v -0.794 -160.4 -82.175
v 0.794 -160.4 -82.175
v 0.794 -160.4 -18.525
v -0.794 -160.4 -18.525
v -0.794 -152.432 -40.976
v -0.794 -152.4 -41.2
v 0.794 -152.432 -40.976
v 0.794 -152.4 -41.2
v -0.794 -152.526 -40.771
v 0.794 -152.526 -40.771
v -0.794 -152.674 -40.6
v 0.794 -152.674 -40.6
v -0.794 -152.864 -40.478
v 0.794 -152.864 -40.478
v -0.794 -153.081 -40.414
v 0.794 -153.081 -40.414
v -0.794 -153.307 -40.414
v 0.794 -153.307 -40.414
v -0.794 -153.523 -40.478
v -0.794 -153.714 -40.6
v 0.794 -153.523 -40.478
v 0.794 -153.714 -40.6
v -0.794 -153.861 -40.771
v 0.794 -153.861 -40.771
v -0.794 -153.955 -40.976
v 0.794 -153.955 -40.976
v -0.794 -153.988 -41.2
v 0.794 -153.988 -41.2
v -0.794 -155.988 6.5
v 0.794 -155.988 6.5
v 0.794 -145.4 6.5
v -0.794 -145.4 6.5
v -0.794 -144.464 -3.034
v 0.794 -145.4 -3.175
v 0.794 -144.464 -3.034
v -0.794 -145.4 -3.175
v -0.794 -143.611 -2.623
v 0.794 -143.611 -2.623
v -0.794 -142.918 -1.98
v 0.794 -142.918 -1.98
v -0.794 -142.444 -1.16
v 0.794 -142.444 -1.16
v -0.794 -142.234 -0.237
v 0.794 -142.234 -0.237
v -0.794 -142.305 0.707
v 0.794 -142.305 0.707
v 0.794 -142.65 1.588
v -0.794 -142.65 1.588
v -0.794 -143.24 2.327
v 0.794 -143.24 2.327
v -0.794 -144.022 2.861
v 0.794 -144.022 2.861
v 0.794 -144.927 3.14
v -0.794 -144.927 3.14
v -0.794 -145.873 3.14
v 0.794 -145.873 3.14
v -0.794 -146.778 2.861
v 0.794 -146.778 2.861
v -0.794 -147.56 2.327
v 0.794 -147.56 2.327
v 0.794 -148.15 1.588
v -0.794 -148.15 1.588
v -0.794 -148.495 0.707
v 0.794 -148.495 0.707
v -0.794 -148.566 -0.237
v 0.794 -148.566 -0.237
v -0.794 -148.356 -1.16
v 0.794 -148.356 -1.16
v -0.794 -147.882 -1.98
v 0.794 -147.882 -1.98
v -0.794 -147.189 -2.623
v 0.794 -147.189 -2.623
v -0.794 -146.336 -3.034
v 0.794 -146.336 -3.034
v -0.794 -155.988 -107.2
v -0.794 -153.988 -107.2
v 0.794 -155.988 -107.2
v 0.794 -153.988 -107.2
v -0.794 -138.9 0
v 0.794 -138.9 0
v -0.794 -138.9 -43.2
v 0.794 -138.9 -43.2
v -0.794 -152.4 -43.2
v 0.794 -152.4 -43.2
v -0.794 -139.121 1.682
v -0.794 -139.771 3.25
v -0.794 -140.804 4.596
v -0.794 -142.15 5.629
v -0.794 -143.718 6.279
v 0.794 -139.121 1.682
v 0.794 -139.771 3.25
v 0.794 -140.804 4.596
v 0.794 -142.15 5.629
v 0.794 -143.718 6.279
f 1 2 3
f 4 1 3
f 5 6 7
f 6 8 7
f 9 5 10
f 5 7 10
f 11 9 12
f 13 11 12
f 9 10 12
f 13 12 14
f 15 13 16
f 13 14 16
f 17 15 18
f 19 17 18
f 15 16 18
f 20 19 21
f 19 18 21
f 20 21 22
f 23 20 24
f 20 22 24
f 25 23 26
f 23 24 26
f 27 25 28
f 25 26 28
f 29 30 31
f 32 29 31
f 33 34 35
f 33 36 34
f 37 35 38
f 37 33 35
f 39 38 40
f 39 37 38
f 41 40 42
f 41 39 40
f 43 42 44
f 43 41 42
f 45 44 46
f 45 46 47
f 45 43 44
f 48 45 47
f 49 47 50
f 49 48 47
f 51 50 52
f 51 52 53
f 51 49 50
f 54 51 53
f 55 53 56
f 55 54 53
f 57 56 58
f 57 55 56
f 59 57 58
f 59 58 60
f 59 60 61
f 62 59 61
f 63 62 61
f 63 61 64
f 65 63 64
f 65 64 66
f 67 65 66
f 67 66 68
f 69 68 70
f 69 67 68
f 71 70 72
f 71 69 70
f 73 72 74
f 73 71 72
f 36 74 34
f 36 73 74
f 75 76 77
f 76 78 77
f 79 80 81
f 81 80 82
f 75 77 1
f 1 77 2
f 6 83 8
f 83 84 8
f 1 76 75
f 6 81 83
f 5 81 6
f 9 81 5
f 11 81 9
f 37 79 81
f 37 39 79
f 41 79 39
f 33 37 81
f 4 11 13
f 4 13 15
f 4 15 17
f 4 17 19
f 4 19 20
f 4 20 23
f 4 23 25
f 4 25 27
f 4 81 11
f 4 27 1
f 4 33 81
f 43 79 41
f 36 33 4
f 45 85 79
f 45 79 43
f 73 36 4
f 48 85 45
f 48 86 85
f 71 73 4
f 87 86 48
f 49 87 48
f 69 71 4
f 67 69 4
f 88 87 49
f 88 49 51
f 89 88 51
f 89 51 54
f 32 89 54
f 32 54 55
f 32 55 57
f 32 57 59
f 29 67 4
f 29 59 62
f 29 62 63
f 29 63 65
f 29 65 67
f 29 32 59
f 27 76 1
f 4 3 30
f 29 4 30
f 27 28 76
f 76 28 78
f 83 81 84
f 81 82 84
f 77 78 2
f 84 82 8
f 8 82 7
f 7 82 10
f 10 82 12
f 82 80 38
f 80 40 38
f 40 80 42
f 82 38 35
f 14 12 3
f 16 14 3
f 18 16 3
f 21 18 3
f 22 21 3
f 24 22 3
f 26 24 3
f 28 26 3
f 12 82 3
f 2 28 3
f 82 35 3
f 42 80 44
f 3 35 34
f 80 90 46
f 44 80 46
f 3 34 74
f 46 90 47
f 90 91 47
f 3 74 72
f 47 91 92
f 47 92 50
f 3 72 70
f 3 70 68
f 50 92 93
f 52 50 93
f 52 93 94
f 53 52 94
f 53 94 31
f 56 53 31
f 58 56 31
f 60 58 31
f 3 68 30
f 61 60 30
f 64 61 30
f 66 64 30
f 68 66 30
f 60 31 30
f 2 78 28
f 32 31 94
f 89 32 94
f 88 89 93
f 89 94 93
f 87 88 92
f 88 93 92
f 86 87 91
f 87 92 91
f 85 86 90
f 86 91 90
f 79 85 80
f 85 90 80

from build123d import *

# Parameters (mm, degrees)
SKETCH1_R           = 3.175
BOSS_EXTRUDE1_DEPTH = 0.79375


with BuildPart() as part:
    # Sketch1 → Boss-Extrude1 (new, symmetric)
    with BuildSketch(Plane.YZ):
        with BuildLine():
            Line((-138.9, 0), (-138.9, -43.2))
            Line((-138.9, -43.2), (-152.4, -43.2))
            Line((-152.4, -43.2), (-152.4, -41.2))
            ThreePointArc((-152.4, -41.2), (-153.19375, -40.40625), (-153.9875, -41.2))
            Line((-153.9875, -41.2), (-153.9875, -107.2))
            Line((-153.9875, -107.2), (-155.9875, -107.2))
            Line((-155.9875, -107.2), (-160.4, -82.175468971))
            Line((-160.4, -82.175468971), (-160.4, -18.524531029))
            Line((-160.4, -18.524531029), (-155.9875, 6.5))
            Line((-155.9875, 6.5), (-145.4, 6.5))
            ThreePointArc((-145.4, 6.5), (-140.803805922, 4.596194078), (-138.9, 0))
        make_face()
        with Locations(Location((-145.4, 0, 0), (0, 0, 270))):
            Circle(SKETCH1_R, mode=Mode.SUBTRACT)
    extrude(amount=BOSS_EXTRUDE1_DEPTH, both=True)


solid = part.part
